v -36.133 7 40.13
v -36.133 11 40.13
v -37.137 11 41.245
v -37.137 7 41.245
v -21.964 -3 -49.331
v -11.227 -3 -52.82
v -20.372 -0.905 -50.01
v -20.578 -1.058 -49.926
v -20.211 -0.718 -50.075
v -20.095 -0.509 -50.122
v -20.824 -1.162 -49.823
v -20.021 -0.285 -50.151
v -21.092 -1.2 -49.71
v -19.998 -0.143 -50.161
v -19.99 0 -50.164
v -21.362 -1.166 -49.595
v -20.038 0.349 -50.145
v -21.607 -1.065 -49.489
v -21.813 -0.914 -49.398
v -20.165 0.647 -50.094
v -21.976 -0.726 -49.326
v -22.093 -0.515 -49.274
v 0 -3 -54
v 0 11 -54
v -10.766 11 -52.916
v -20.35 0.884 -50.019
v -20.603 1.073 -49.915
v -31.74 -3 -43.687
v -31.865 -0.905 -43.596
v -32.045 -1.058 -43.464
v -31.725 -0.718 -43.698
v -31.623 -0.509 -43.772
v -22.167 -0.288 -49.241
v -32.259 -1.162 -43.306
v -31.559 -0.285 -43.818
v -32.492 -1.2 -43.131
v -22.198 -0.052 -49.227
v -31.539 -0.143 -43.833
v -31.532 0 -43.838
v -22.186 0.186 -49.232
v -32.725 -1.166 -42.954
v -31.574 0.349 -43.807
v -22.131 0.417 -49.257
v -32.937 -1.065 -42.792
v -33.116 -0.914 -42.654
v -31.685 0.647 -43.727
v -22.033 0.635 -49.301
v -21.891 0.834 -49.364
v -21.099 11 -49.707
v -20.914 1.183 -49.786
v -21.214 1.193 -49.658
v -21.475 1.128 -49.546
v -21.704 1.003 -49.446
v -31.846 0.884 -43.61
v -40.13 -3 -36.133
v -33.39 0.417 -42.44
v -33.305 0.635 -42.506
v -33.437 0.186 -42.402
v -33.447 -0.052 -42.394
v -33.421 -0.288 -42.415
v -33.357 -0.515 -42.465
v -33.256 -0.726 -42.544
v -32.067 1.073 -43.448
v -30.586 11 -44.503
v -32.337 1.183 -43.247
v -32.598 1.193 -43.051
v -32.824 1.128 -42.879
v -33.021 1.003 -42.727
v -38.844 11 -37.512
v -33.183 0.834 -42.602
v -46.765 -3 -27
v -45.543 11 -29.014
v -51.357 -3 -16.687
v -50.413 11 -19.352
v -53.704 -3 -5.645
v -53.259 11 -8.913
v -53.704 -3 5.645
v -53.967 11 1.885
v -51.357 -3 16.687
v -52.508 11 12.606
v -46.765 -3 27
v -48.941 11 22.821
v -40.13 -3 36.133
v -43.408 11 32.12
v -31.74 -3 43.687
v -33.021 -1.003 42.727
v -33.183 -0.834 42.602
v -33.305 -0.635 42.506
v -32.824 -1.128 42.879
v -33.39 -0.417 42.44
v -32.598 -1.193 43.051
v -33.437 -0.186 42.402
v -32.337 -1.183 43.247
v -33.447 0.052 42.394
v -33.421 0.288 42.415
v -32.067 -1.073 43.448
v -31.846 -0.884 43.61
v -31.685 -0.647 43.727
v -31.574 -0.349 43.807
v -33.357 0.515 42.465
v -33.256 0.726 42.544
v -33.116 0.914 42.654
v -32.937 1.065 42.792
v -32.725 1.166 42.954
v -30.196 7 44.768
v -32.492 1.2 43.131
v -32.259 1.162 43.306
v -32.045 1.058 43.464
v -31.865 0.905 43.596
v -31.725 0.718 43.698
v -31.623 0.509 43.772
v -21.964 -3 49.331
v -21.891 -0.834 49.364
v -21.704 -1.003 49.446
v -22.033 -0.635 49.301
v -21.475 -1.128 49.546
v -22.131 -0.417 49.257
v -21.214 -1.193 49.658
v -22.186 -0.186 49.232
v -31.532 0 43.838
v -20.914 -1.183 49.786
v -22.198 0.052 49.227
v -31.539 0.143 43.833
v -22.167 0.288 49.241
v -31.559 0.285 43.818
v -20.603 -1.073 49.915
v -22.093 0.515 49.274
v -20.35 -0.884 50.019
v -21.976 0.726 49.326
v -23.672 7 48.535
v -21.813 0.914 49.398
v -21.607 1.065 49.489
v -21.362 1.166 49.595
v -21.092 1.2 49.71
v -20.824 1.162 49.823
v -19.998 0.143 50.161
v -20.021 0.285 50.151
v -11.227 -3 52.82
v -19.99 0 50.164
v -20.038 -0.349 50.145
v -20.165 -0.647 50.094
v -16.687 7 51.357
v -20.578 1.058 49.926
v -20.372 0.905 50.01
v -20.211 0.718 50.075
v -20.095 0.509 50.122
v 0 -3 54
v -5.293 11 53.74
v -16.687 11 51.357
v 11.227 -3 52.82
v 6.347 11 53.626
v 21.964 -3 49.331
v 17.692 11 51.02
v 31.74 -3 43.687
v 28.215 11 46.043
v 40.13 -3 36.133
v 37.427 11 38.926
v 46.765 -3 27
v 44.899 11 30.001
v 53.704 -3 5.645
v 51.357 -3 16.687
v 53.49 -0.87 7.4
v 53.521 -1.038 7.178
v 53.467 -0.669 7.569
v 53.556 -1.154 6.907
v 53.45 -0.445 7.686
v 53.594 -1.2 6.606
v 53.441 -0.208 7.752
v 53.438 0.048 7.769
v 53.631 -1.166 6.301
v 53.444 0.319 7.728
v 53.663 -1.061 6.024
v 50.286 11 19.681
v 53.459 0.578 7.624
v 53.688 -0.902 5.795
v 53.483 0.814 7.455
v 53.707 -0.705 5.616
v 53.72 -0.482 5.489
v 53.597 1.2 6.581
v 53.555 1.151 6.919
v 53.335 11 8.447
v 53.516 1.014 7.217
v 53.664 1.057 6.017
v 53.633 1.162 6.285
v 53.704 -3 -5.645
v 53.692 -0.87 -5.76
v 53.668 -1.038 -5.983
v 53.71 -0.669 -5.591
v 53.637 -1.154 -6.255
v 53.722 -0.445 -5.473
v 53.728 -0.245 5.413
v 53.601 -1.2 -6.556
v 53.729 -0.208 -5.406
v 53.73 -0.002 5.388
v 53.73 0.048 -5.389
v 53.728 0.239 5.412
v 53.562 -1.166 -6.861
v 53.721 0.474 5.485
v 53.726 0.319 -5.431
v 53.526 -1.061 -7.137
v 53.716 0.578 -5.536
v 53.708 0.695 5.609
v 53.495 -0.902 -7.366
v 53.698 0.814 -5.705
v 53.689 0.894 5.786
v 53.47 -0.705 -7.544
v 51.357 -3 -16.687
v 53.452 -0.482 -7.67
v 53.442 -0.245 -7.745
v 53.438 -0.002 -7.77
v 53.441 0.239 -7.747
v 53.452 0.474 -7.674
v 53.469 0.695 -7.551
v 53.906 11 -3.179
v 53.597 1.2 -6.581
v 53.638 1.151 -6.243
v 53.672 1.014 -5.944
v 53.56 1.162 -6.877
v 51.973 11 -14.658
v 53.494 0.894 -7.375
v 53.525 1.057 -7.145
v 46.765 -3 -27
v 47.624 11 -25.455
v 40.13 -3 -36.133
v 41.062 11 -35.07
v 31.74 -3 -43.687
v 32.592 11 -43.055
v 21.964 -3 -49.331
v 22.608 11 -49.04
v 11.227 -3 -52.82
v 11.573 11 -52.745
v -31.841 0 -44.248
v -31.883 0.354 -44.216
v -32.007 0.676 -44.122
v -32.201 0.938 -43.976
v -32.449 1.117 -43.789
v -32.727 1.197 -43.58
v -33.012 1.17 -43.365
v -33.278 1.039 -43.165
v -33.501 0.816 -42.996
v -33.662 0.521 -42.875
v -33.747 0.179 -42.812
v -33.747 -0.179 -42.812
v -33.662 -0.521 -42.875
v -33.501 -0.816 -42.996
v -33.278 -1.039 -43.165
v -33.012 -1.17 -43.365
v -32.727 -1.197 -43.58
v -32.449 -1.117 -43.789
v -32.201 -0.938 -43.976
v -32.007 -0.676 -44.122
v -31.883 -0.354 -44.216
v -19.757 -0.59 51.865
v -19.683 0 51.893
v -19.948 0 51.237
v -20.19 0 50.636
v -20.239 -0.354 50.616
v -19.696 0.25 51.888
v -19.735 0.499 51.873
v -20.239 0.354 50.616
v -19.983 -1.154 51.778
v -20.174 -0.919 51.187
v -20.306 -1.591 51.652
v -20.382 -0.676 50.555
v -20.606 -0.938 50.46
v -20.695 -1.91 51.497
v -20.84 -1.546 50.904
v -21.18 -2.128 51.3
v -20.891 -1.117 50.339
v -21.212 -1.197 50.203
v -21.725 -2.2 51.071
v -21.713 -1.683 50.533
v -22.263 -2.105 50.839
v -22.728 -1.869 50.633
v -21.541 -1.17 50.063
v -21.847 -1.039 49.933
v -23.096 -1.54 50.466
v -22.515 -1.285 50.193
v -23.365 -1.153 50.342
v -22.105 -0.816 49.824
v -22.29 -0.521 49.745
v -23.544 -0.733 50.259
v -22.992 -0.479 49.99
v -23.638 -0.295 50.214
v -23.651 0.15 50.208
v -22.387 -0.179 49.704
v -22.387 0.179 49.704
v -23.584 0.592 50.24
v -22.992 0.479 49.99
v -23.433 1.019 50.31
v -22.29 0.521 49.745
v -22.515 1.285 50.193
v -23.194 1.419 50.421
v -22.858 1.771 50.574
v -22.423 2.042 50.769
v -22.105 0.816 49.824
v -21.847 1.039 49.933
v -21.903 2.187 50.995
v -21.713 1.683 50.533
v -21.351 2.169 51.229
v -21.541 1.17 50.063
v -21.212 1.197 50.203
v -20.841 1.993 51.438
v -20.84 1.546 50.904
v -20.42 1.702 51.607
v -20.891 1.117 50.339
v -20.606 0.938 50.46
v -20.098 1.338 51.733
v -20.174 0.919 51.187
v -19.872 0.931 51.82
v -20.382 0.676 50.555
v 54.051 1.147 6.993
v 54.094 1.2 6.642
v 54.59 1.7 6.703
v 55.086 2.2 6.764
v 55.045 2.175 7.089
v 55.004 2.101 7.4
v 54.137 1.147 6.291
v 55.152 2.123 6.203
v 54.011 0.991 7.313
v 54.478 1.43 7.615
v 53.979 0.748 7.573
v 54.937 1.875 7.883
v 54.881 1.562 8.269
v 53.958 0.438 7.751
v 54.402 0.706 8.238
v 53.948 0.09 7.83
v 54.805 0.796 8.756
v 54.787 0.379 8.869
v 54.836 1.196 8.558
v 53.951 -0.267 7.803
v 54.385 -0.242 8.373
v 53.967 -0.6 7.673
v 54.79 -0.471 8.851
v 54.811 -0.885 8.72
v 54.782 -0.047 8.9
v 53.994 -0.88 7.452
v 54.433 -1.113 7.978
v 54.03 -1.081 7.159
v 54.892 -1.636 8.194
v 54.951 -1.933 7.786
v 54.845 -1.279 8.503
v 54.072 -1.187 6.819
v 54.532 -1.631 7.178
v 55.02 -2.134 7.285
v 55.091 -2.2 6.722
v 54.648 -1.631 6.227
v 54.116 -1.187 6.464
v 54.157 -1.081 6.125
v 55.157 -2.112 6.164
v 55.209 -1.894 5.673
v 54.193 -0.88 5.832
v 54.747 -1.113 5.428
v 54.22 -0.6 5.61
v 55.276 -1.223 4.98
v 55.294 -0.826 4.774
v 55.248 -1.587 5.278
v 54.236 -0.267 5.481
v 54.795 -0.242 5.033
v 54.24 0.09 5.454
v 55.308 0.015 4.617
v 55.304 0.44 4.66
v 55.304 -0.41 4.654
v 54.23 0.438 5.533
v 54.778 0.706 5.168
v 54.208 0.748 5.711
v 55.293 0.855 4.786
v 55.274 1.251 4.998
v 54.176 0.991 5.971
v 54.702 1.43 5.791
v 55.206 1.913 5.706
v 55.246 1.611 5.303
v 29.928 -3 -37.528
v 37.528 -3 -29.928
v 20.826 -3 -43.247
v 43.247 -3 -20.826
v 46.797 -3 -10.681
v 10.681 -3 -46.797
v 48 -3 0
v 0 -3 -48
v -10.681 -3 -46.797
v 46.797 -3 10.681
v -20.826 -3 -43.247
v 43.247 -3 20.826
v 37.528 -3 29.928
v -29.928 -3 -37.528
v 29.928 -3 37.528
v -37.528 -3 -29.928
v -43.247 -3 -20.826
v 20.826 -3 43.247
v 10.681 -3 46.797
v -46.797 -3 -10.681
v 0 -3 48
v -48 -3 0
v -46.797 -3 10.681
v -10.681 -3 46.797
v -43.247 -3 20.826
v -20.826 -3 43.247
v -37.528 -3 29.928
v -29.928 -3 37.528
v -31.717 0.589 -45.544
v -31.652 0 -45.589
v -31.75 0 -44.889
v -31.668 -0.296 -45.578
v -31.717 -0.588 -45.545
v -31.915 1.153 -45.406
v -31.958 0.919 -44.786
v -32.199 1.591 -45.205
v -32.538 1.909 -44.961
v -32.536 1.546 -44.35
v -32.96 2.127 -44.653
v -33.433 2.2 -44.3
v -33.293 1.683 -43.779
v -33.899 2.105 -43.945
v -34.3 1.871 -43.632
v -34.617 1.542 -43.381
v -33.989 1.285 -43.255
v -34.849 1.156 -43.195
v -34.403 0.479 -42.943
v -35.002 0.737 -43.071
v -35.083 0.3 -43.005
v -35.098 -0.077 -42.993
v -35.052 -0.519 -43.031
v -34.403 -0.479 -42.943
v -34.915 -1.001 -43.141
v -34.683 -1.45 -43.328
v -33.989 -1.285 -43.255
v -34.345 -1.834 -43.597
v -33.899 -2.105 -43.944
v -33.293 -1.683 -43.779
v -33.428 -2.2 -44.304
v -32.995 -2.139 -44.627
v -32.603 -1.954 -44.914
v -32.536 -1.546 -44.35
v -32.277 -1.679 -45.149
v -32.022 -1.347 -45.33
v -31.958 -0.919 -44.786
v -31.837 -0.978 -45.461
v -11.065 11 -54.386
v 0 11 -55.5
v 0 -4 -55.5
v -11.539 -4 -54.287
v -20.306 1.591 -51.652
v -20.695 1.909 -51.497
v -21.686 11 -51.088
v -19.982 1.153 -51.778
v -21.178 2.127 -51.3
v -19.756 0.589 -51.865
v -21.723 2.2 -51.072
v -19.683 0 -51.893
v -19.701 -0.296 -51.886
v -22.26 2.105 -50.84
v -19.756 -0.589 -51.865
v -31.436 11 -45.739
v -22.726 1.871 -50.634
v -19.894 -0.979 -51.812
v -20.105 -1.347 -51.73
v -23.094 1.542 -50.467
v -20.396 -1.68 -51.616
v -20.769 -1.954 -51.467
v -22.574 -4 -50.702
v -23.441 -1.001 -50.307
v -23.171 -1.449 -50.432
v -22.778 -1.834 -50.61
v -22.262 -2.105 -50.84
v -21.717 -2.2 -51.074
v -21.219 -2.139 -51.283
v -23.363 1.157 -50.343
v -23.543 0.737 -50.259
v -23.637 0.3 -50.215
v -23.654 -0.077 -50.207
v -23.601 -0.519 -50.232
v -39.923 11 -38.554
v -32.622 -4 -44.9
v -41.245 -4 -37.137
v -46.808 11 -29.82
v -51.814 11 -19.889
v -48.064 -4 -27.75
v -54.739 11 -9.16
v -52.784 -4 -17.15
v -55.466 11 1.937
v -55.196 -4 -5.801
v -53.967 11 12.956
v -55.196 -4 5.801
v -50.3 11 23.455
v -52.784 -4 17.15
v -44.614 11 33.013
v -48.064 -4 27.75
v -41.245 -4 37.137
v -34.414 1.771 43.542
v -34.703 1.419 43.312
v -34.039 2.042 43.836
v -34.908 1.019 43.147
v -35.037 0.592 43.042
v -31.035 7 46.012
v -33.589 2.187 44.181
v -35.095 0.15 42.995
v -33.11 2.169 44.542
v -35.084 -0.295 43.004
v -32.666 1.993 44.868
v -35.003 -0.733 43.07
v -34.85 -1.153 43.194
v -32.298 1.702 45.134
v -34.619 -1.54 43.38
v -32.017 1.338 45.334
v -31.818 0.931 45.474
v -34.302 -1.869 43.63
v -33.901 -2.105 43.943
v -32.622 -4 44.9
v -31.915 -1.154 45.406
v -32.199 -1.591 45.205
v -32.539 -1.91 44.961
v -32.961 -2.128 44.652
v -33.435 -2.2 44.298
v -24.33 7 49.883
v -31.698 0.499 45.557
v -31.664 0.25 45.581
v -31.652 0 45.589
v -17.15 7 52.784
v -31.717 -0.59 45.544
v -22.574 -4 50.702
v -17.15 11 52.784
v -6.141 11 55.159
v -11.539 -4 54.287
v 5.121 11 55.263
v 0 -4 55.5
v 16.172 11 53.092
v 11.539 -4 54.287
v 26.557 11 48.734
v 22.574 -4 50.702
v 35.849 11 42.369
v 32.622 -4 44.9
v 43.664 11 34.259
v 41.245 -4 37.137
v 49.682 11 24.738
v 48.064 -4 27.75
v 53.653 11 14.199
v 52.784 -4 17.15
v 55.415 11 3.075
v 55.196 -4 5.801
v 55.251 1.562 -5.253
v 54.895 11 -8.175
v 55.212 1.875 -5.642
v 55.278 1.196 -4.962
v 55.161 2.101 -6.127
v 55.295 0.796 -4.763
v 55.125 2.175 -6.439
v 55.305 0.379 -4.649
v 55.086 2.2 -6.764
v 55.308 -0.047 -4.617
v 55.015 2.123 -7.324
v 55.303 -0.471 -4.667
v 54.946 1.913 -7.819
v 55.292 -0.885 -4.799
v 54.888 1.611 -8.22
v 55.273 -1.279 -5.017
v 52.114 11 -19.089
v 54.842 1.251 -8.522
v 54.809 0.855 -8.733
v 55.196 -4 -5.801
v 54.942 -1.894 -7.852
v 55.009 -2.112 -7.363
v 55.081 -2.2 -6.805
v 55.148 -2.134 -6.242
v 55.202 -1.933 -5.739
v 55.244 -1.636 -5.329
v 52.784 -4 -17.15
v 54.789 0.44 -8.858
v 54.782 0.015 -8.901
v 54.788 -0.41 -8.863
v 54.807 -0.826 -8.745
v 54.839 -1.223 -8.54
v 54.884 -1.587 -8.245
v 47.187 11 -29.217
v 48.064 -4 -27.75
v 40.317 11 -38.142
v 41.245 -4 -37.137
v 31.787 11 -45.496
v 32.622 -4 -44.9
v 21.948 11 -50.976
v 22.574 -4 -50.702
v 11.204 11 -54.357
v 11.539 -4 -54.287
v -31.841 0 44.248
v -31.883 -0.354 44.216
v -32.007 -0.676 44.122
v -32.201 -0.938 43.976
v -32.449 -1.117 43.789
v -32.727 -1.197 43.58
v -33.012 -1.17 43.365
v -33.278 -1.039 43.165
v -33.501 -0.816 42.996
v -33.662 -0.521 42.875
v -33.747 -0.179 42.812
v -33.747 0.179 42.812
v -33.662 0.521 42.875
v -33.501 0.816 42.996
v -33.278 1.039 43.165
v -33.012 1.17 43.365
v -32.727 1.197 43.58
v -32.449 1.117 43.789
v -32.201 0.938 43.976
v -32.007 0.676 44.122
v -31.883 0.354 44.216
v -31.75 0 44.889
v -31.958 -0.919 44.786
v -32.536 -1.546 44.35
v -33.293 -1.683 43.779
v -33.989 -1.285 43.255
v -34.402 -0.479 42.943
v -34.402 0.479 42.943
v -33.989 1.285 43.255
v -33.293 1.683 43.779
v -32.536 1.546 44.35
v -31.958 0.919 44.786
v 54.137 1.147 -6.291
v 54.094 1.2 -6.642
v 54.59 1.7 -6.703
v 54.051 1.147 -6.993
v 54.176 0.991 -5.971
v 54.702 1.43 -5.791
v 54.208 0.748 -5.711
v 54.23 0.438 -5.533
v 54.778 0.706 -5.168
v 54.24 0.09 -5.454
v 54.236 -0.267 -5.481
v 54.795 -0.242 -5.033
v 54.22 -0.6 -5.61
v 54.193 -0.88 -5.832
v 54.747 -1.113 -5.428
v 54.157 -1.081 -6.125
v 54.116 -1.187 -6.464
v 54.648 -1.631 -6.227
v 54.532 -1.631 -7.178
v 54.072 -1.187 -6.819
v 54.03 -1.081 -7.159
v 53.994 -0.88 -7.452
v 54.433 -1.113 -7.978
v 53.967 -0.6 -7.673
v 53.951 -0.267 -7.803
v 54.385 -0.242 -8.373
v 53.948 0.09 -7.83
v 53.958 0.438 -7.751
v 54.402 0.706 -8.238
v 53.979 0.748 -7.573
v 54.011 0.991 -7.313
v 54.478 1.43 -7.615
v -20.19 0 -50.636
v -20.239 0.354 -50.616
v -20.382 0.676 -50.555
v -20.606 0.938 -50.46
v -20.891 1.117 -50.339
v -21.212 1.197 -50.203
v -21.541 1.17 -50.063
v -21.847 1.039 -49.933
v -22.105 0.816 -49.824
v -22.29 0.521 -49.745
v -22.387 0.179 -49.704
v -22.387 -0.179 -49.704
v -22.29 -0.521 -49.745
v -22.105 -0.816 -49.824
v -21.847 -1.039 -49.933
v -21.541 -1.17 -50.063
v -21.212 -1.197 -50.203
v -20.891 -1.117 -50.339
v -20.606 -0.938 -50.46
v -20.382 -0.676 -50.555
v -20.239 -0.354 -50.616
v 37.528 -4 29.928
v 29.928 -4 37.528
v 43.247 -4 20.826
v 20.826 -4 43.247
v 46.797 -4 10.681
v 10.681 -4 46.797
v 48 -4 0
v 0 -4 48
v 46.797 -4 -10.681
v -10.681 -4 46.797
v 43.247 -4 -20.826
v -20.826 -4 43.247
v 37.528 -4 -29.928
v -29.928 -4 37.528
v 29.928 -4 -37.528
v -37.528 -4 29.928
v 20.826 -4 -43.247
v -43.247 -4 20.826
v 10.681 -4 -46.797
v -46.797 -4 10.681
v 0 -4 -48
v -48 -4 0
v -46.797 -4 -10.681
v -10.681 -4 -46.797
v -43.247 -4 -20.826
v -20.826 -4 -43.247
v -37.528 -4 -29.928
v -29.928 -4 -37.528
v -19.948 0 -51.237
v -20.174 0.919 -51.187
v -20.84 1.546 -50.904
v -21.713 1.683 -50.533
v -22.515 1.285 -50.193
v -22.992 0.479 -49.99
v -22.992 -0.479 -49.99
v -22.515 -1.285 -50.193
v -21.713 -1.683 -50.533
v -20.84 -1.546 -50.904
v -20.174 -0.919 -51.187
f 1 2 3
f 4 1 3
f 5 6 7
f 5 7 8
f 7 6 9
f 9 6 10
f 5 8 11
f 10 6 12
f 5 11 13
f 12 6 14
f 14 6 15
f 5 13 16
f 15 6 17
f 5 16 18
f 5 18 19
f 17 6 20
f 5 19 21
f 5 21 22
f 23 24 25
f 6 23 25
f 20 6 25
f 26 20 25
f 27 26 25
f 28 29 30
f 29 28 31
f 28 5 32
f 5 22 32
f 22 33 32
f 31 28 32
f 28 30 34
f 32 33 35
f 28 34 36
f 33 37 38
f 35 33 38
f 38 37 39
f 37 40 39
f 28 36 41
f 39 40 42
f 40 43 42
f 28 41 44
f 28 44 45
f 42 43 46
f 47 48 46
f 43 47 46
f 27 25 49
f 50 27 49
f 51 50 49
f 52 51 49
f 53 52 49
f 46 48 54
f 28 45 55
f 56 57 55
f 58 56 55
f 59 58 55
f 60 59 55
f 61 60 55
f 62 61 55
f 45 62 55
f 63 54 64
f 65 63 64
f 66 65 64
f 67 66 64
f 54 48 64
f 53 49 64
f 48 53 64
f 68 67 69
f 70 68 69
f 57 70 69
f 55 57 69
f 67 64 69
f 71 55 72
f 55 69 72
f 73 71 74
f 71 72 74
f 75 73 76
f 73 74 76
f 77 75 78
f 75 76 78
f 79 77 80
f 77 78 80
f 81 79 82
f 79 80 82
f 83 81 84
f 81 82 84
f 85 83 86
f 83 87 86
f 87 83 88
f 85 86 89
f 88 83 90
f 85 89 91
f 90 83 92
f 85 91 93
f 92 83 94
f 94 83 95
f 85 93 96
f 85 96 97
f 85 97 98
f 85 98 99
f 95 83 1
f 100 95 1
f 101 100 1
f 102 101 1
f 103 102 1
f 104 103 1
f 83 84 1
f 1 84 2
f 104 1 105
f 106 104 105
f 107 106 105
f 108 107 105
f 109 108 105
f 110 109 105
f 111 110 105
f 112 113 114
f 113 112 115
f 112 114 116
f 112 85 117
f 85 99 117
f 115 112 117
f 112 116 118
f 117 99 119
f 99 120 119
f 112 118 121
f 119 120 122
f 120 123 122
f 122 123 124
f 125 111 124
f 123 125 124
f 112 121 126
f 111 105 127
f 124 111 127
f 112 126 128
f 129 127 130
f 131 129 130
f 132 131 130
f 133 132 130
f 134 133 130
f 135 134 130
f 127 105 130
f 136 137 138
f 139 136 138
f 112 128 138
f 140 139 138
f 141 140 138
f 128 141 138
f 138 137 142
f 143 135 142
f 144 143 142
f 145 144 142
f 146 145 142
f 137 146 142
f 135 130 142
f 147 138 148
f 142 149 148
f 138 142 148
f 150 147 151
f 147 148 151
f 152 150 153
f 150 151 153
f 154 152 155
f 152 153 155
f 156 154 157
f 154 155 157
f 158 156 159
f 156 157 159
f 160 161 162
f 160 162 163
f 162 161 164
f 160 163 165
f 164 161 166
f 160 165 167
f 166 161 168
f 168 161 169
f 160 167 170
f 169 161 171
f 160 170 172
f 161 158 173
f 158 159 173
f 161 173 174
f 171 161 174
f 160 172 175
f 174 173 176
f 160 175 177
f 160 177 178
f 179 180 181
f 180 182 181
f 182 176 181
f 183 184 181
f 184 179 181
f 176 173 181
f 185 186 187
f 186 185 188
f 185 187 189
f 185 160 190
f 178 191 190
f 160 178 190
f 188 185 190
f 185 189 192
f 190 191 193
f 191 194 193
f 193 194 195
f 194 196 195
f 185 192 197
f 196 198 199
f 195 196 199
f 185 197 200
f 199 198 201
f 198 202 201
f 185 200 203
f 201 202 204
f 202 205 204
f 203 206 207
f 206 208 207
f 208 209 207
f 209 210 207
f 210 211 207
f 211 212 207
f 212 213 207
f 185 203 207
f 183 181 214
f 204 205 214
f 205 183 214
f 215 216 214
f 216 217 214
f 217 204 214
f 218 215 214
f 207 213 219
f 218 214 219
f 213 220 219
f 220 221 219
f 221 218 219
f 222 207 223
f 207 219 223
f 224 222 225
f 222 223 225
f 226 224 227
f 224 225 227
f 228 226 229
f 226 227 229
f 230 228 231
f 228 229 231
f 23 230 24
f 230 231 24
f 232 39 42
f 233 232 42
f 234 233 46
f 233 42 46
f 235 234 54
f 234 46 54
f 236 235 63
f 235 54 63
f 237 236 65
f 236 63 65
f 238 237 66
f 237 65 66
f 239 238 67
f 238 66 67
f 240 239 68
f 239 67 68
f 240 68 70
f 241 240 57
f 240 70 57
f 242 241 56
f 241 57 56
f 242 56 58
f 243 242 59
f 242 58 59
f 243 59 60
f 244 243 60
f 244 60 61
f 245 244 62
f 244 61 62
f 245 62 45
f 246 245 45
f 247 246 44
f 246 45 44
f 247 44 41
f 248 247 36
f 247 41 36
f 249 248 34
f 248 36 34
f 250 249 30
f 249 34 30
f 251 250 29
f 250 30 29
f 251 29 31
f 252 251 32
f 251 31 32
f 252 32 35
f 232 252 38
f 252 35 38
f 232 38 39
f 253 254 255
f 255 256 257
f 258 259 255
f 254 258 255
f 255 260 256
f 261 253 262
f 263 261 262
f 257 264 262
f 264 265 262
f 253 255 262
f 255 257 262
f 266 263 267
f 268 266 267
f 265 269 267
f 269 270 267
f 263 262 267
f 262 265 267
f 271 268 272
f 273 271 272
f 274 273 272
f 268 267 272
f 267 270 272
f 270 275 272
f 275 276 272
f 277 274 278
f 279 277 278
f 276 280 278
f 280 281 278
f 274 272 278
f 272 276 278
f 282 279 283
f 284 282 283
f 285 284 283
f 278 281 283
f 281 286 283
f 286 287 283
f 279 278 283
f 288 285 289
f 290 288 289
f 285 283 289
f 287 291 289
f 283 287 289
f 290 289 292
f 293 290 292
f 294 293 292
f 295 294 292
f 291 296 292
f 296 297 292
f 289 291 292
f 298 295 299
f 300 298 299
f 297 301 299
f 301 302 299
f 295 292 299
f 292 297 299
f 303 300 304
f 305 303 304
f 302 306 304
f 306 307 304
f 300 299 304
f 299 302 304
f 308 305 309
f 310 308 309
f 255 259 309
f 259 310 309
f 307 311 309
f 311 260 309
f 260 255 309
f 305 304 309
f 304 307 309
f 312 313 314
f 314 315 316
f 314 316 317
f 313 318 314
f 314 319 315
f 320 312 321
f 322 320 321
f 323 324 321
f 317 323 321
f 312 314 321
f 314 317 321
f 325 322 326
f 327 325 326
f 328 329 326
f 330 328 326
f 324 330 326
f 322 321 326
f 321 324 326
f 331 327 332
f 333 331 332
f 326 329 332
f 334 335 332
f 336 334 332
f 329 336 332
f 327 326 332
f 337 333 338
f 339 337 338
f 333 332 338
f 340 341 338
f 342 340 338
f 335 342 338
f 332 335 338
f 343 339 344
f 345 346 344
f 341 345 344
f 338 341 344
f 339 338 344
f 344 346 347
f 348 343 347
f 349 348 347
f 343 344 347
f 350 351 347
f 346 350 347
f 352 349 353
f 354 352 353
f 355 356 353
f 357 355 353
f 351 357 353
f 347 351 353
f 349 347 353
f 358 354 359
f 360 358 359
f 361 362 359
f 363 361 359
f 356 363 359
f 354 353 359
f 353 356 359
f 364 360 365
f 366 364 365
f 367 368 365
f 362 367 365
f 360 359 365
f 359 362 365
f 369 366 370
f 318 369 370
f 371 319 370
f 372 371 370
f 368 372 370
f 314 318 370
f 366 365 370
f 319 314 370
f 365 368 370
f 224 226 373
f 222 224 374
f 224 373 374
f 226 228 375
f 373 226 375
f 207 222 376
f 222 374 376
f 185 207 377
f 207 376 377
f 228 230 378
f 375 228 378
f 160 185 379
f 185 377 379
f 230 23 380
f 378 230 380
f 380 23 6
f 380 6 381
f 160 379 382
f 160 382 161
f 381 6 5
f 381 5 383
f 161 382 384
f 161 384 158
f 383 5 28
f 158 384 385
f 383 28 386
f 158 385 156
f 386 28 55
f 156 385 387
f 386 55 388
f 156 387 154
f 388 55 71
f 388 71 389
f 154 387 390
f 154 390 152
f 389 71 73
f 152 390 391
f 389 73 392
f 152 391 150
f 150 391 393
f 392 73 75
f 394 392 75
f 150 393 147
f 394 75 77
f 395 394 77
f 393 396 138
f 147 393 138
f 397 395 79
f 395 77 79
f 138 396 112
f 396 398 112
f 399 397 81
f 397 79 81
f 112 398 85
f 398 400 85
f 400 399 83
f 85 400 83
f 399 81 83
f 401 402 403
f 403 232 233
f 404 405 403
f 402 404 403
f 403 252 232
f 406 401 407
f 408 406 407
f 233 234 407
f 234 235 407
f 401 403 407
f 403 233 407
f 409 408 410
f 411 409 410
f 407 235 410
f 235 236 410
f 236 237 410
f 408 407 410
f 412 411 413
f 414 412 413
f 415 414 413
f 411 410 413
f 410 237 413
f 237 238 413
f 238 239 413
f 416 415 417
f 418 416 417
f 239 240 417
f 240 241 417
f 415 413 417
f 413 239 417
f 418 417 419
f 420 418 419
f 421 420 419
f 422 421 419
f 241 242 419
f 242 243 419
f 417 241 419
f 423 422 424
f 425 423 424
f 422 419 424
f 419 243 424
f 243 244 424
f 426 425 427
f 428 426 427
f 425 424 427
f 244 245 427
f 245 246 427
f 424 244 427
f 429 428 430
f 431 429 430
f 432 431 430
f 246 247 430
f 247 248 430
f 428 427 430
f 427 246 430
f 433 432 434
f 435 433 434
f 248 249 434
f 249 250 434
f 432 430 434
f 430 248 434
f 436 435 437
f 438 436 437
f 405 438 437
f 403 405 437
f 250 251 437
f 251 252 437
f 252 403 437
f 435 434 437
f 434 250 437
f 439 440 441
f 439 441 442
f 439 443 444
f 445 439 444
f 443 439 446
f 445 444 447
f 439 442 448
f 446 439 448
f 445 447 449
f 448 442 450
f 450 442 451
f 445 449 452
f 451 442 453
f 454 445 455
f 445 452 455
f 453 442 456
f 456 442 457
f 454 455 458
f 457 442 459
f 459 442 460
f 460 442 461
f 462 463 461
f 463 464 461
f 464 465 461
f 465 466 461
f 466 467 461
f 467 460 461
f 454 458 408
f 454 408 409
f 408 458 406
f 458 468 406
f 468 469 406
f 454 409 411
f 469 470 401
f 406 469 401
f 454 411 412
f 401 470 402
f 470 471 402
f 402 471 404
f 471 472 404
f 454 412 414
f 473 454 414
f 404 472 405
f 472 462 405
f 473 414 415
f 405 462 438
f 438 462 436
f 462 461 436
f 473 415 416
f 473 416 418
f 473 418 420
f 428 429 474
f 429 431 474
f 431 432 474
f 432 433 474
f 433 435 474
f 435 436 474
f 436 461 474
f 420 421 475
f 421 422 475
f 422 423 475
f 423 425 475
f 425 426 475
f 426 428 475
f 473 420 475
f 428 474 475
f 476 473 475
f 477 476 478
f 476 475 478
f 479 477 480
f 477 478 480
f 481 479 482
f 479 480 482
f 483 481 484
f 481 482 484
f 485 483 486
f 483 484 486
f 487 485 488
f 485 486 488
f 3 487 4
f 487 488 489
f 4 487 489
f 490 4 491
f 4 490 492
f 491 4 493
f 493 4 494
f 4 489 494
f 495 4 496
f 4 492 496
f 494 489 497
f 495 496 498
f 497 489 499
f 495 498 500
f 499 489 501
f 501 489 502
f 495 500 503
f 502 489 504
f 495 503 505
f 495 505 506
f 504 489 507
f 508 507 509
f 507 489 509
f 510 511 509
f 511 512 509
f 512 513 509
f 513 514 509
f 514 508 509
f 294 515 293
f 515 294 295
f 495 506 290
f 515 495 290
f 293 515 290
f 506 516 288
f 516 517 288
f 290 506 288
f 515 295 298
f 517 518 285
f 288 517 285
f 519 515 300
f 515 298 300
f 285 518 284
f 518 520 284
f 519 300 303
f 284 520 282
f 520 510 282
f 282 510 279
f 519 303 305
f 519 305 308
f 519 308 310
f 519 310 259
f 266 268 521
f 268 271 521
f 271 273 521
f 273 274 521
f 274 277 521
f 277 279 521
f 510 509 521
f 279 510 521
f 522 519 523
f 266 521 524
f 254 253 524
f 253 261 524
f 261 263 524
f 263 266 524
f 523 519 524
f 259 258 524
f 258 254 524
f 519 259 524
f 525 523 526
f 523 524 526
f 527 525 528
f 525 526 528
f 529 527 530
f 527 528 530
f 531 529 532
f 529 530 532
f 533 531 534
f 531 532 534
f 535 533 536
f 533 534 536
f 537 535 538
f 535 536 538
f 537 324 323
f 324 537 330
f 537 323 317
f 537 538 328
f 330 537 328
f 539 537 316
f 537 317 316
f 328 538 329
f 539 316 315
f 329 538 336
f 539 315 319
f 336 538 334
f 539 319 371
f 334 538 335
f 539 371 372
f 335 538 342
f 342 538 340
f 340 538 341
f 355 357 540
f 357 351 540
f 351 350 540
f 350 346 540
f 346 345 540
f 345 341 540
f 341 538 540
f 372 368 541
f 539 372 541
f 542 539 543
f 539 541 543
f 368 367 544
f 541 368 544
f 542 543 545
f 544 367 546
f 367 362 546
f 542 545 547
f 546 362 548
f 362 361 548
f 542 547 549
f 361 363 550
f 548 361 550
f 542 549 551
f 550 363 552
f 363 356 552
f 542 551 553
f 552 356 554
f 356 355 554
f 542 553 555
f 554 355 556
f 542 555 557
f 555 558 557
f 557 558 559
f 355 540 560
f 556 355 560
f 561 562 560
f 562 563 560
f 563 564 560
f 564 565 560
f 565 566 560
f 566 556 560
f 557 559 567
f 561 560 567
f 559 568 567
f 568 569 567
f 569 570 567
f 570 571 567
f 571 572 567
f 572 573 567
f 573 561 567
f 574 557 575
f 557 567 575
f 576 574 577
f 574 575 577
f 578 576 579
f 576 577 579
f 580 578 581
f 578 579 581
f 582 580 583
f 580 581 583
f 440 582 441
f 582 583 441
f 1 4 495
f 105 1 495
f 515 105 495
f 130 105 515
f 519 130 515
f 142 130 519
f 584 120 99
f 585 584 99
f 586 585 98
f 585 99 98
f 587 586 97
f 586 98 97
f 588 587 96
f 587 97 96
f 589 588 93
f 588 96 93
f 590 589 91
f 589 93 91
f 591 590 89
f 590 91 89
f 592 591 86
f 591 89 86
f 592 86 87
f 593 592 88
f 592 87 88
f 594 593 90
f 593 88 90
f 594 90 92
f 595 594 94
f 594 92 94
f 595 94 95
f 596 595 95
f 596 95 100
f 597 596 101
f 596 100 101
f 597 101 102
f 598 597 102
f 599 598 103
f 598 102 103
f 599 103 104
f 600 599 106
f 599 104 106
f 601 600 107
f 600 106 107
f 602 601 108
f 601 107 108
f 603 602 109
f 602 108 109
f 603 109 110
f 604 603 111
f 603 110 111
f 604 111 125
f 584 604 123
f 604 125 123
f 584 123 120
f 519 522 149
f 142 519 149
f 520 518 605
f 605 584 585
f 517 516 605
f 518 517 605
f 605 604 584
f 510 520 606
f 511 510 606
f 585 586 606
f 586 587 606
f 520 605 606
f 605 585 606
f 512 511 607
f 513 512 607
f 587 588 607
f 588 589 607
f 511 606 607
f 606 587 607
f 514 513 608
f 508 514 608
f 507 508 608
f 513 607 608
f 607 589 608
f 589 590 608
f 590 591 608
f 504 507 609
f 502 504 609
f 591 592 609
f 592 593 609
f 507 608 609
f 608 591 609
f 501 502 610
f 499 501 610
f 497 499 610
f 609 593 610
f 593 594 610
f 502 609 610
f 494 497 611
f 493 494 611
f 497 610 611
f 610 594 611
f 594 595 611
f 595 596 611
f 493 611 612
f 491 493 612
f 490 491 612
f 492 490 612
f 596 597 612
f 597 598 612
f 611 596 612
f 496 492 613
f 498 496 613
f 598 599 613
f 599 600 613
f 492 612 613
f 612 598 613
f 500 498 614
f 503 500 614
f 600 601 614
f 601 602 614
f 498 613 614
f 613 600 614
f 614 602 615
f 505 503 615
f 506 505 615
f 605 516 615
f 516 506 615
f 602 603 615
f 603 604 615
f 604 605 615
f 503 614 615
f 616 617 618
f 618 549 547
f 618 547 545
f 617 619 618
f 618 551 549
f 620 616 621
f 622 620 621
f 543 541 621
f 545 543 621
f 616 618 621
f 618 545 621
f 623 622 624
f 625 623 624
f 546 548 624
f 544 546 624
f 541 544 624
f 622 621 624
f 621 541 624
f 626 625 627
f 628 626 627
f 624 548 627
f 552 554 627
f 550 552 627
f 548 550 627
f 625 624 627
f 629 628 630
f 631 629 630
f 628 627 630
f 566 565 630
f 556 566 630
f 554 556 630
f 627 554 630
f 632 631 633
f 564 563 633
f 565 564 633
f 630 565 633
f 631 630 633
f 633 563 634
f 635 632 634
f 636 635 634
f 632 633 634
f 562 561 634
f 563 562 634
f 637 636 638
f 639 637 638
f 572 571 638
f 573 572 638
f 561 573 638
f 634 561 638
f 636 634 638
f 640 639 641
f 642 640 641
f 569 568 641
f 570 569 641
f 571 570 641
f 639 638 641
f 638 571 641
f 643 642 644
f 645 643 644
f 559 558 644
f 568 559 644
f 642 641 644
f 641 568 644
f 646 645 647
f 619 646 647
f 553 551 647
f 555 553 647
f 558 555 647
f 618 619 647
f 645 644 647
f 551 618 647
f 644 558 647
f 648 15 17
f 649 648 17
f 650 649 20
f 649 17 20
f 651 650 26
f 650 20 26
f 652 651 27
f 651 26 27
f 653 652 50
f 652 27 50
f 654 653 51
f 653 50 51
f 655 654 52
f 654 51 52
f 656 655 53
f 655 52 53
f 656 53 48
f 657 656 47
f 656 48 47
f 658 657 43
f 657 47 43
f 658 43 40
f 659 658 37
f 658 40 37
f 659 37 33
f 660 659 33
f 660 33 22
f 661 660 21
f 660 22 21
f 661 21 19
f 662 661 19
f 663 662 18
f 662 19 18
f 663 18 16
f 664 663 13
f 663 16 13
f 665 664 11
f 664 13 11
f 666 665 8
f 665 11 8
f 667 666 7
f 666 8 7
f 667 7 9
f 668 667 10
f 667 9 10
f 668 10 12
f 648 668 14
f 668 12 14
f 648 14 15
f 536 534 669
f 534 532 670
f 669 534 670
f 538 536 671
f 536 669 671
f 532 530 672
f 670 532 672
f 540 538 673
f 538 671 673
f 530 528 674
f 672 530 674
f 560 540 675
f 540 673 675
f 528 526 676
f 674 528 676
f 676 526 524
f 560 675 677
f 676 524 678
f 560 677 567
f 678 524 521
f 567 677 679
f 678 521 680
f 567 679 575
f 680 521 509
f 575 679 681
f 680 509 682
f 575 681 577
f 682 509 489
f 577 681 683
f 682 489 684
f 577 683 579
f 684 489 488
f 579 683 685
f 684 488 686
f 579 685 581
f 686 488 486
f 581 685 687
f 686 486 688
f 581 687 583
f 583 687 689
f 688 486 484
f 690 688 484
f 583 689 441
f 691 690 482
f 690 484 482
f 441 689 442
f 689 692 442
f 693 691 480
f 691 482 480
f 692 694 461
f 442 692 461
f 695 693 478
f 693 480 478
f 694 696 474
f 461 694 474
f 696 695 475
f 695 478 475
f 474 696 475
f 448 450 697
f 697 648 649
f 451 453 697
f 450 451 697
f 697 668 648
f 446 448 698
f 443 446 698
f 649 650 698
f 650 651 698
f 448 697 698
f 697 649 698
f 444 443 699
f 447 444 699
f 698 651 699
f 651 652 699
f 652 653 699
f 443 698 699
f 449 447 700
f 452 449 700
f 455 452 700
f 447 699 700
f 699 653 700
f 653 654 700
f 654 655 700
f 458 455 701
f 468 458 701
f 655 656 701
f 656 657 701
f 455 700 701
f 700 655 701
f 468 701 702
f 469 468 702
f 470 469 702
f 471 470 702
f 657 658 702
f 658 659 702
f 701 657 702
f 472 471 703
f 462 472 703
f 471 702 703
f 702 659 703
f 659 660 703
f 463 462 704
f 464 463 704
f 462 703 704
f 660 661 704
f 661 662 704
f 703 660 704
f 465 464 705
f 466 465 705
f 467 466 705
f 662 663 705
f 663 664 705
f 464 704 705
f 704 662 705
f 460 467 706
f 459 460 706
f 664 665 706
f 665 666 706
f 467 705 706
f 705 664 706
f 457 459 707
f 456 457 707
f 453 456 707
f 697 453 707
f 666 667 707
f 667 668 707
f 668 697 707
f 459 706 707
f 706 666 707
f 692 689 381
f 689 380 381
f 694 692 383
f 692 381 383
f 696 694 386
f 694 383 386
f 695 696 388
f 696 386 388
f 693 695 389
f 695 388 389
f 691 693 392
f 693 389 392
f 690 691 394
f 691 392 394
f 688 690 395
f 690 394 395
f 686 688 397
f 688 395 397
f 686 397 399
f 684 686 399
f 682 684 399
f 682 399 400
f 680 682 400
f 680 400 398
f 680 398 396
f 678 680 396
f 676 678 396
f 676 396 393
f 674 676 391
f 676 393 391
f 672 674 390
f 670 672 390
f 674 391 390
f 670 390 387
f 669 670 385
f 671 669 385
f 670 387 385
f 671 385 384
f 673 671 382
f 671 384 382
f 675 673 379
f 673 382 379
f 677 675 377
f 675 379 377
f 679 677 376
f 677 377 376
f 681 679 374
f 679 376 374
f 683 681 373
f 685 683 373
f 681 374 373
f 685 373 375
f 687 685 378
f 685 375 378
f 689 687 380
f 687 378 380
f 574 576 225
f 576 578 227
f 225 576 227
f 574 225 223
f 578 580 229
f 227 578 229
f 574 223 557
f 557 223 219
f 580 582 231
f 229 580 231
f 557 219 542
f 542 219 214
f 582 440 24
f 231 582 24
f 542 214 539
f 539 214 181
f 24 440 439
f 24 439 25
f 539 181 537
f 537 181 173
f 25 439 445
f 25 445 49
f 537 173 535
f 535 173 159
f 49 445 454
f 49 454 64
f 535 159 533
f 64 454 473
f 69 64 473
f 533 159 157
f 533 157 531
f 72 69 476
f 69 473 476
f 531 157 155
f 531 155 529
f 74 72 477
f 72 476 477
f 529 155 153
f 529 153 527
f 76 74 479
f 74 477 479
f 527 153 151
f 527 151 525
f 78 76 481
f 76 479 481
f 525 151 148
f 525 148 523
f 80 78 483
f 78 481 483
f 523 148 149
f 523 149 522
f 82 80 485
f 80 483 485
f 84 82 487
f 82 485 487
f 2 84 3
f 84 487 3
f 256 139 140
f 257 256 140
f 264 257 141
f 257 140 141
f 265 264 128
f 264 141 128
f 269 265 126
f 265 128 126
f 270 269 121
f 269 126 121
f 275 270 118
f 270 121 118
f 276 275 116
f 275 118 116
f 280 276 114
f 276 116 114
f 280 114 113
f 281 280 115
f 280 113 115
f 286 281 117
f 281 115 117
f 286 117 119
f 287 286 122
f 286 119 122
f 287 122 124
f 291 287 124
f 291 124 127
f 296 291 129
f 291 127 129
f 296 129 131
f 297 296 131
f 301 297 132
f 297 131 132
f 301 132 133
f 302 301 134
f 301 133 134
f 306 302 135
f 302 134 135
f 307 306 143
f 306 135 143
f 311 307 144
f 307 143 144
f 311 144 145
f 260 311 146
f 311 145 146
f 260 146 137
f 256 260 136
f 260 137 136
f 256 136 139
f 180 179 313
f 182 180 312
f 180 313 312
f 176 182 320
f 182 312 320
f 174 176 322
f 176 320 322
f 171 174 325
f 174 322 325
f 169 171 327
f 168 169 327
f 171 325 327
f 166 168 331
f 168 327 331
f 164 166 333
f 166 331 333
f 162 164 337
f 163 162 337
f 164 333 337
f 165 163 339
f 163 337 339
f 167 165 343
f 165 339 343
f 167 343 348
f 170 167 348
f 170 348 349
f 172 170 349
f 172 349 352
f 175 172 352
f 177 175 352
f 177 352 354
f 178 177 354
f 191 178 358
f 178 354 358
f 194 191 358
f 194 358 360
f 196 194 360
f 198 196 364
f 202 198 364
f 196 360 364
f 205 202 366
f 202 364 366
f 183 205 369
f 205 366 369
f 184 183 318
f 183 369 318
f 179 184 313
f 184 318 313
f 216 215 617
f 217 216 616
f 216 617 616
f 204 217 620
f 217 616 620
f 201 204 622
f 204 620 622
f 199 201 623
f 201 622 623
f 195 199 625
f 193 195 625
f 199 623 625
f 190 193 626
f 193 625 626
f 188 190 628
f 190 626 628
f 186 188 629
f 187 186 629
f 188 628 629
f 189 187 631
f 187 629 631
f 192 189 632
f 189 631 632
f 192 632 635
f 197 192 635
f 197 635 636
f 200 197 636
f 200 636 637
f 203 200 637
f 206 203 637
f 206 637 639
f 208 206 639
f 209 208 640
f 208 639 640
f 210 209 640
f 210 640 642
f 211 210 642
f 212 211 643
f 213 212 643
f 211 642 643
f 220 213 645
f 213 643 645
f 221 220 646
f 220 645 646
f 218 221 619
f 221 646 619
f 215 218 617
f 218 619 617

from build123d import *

# Parameters (mm, degrees)
CUT_EXTRUDE2_DEPTH = 4


# Read off the part's stored shape, not the designer's step: CSK for M2 Flat Head Machine Screw1
with BuildPart() as part:
    # Sketch1 → Revolve1 (revolve)
    with BuildSketch(Plane.XY, mode=Mode.PRIVATE) as revolve1_sk:
        Polygon((54, 11), (55.5, 11), (55.5, -4), (48, -4), (48, -3), (54, -3), align=None)
    revolve(revolve1_sk.sketch.rotate(Axis((0, 0, 0), (0, 1, 0)), 90), axis=Axis((0, 0, 0), (0, 1, 0)))

    # Sketch7 → Cut-Extrude2 (cut)
    with BuildSketch(Plane(origin=(0, 11, 0), x_dir=(1, 0, 0), z_dir=(0, 1, 0))):
        with BuildLine():
            Line((-17.150443188, -52.783636654), (-16.686917696, -51.35705188))
            ThreePointArc((-16.686917696, -51.35705188), (-27, -46.765371804), (-36.133052743, -40.129820576))
            Line((-36.133052743, -40.129820576), (-37.136748653, -41.244537814))
            ThreePointArc((-37.136748653, -41.244537814), (-27.75, -48.06440991), (-17.150443188, -52.783636654))
        make_face()
    extrude(amount=-CUT_EXTRUDE2_DEPTH, mode=Mode.SUBTRACT)

    # CSK for M2 Flat Head Machine Screw1 outl → CSK for M2 Flat Head Machine Screw1 (revolve, cut)
    with BuildSketch(Plane(origin=(0, 0, 0), x_dir=(0, 1, 0), z_dir=(-0.121869343405148, 0, -0.992546151641322))):
        Polygon((2.200019656, 55.500019656), (0, 55.500019656), (0, 53.986657854), (1.2, 53.986657854), (1.2, 54.5), align=None)
    revolve(axis=Axis((0, 0, 0), (0.992546151641322, 0, -0.121869343405148)), mode=Mode.SUBTRACT)

    # CSK for M2 Flat Head Machine Screw1 2 ou → CSK for M2 Flat Head Machine Screw1 2 (revolve, cut)
    with BuildSketch(Plane(origin=(0, 0, 0), x_dir=(0, 1, 0), z_dir=(0.12186934340514702, 0, -0.9925461516413221))):
        Polygon((2.200023885, 55.500023885), (0, 55.500023885), (0, 53.986657854), (1.2, 53.986657854), (1.2, 54.5), align=None)
    revolve(axis=Axis((0, 0, 0), (0.9925461516413221, 0, 0.12186934340514702)), mode=Mode.SUBTRACT)

    # CSK for M2 Flat Head Machine Screw1 3 ou → CSK for M2 Flat Head Machine Screw1 3 (revolve, cut)
    with BuildSketch(Plane(origin=(0, 0, 0), x_dir=(0.9205048534524387, 0, -0.3907311284892778), z_dir=(0, -1, 0))):
        Polygon((0, -55.500018568), (2.200018568, -55.500018568), (1.2, -54.5), (1.2, -53.986657854), (0, -53.986657854), align=None)
    revolve(axis=Axis((0, 0, 0), (0.3907311284892778, 0, 0.9205048534524387)), mode=Mode.SUBTRACT)

    # CSK for M2 Flat Head Machine Screw1 4 ou → CSK for M2 Flat Head Machine Screw1 4 (revolve, cut)
    with BuildSketch(Plane(origin=(0, 0, 0), x_dir=(0.79863551004729, 0, -0.601815023152052), z_dir=(0, -1, 0))):
        Polygon((0, -55.500012206), (2.200012206, -55.500012206), (1.2, -54.5), (1.2, -53.986657854), (0, -53.986657854), align=None)
    revolve(axis=Axis((0, 0, 0), (0.601815023152052, 0, 0.79863551004729)), mode=Mode.SUBTRACT)

    # CSK for M2 Flat Head Machine Screw1 5 ou → CSK for M2 Flat Head Machine Screw1 5 (revolve, cut)
    with BuildSketch(Plane(origin=(0, 0, 0), x_dir=(0.9205048534524416, 0, 0.39073112848927083), z_dir=(0, 1, 0))):
        Polygon((0, -55.500018348), (2.200018348, -55.500018348), (1.2, -54.5), (1.2, -53.986657854), (0, -53.986657854), align=None)
    revolve(axis=Axis((0, 0, 0), (0.39073112848927083, 0, -0.9205048534524416)), mode=Mode.SUBTRACT)

    # CSK for M2 Flat Head Machine Screw1 6 ou → CSK for M2 Flat Head Machine Screw1 6 (revolve, cut)
    with BuildSketch(Plane(origin=(0, 0, 0), x_dir=(0.7986355100472992, 0, 0.60181502315204), z_dir=(0, 1, 0))):
        Polygon((0, -55.50002414), (2.20002414, -55.50002414), (1.2, -54.5), (1.2, -53.986657854), (0, -53.986657854), align=None)
    revolve(axis=Axis((0, 0, 0), (0.60181502315204, 0, -0.7986355100472992)), mode=Mode.SUBTRACT)


solid = part.part
